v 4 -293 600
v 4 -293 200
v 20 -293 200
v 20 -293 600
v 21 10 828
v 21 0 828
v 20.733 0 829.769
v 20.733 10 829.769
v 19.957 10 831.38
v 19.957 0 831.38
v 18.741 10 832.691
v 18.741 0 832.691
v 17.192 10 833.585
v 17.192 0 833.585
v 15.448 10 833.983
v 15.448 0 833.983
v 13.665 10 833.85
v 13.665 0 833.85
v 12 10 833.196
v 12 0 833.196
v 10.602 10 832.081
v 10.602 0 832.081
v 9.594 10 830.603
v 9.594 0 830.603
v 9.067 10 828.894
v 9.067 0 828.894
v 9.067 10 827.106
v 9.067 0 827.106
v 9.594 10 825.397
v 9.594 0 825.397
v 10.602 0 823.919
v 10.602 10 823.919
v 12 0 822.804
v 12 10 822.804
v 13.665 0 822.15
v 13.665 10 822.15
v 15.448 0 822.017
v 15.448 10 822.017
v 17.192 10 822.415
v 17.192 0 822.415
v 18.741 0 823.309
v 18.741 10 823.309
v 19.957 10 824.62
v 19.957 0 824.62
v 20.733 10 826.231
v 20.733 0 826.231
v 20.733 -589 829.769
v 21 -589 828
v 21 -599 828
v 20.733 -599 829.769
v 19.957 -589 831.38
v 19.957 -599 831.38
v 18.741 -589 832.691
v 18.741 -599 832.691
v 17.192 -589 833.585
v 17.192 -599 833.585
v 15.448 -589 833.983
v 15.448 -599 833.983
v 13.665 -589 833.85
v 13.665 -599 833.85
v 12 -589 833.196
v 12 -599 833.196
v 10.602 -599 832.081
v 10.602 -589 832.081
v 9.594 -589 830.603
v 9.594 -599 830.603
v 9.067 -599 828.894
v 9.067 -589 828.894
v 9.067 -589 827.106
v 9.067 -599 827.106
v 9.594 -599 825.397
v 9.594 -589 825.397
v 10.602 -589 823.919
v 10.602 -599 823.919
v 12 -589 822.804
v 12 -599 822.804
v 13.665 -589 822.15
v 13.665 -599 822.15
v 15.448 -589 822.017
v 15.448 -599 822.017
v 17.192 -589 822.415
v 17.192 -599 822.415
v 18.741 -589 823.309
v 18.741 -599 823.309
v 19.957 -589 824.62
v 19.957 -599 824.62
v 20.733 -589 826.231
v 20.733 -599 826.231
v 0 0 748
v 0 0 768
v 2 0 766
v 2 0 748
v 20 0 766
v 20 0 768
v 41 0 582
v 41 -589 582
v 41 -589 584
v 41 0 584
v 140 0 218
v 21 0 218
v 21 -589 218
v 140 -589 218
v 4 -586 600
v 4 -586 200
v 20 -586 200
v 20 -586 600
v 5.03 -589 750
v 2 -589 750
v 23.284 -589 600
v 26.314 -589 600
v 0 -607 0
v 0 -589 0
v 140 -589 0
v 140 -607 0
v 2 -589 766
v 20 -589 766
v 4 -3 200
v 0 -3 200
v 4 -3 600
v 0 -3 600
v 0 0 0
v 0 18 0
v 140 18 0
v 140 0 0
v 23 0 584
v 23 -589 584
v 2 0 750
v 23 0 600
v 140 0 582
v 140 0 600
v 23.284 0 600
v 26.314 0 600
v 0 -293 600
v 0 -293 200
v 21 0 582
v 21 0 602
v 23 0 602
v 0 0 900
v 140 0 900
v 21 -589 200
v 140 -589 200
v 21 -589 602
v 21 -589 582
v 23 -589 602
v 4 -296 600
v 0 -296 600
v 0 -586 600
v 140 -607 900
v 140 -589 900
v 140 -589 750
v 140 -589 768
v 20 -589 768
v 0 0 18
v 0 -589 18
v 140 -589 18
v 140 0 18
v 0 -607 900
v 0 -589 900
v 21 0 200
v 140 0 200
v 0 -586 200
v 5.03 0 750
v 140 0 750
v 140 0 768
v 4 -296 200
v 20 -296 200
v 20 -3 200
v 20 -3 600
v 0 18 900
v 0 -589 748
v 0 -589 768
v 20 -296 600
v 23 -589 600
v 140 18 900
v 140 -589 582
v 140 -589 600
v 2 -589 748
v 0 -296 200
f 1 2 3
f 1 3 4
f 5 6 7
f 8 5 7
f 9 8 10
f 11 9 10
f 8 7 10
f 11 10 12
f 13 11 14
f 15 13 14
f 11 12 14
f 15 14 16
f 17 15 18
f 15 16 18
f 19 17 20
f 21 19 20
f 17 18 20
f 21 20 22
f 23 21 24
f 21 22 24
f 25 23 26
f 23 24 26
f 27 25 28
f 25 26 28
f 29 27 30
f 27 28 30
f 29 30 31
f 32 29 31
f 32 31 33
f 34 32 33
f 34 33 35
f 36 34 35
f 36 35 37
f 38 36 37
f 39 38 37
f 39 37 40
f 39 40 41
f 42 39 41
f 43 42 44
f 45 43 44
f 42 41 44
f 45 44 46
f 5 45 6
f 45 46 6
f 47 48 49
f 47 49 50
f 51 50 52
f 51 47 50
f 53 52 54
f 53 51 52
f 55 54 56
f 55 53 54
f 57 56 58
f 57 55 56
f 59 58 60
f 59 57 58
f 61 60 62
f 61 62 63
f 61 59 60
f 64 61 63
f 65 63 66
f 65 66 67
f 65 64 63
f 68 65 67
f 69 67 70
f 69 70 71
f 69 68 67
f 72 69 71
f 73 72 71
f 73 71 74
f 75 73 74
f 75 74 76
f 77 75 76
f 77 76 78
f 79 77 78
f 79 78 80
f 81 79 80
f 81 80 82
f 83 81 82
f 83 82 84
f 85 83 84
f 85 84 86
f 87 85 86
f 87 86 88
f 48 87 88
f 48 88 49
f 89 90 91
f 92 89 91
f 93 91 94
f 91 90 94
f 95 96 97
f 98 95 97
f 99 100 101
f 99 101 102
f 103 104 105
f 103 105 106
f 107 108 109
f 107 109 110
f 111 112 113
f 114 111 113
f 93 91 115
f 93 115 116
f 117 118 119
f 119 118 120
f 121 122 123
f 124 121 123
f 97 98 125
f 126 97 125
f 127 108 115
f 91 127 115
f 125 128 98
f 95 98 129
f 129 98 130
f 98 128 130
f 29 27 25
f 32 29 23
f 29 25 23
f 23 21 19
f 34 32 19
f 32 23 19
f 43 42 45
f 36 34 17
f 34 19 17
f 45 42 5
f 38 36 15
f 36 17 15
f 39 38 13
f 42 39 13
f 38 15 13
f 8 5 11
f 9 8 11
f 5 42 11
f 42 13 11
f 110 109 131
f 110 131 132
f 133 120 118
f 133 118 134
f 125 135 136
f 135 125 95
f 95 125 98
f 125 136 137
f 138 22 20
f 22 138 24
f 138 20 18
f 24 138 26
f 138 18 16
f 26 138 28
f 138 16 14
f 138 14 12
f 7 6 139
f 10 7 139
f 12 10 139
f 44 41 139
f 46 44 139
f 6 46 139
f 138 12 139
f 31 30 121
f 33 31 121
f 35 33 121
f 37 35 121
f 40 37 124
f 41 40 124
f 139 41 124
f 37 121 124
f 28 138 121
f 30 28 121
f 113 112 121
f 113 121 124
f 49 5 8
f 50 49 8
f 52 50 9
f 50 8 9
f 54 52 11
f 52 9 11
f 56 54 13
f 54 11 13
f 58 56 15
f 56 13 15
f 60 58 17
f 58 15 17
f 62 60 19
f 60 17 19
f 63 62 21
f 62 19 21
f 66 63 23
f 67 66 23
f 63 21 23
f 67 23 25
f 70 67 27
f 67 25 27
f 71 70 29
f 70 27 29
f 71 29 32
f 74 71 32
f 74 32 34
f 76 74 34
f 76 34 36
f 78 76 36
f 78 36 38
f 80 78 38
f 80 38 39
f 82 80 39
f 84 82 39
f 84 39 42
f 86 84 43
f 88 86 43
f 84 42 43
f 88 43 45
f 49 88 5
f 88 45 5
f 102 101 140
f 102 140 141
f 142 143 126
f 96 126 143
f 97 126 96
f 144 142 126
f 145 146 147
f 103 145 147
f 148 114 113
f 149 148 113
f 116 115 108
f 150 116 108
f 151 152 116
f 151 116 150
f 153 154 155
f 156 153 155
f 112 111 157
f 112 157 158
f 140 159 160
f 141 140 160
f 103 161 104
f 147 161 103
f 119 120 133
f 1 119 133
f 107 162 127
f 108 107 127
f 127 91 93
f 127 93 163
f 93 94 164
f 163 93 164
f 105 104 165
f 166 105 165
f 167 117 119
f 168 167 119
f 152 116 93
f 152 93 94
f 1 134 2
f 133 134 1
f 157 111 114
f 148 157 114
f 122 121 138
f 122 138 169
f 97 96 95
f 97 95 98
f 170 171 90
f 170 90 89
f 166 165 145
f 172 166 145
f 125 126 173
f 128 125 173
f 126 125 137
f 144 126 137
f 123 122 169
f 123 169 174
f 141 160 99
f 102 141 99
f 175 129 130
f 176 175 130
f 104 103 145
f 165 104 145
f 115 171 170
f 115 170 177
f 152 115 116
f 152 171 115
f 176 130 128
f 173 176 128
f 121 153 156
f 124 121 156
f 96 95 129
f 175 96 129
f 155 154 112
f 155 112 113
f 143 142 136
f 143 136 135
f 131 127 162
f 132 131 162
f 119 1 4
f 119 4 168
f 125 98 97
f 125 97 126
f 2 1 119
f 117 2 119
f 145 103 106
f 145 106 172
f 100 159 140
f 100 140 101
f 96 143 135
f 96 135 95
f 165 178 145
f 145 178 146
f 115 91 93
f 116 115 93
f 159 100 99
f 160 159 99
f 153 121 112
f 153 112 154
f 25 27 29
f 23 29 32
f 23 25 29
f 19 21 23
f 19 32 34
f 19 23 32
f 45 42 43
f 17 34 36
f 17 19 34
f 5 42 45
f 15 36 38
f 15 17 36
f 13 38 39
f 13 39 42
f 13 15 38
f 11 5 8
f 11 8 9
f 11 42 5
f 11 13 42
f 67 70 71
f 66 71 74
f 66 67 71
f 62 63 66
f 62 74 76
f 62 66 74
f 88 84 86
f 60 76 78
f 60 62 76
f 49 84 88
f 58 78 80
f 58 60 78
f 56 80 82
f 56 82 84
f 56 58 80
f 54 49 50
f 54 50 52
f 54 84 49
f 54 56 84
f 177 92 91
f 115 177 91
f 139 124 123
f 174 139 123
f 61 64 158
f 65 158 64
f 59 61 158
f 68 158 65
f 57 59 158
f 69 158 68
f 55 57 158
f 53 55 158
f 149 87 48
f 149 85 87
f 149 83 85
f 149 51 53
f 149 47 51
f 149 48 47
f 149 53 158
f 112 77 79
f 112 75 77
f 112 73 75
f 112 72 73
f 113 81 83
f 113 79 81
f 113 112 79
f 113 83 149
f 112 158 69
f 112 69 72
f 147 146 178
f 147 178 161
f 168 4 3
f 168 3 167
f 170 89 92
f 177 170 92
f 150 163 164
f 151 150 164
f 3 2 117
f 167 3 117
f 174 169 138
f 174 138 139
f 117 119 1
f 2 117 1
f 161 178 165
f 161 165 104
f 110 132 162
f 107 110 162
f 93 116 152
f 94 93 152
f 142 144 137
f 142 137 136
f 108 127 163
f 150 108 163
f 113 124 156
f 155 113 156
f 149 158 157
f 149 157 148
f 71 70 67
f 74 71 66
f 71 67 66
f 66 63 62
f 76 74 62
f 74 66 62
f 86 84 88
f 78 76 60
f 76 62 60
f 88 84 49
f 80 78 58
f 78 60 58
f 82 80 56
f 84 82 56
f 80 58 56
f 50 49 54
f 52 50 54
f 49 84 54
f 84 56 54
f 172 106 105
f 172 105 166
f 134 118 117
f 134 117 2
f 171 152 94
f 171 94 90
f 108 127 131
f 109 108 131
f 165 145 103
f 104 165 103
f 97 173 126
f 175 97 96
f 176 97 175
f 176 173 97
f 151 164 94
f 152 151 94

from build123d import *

# Parameters (mm, degrees)
F0_W           = 140
F0_H           = 18
F1_DEPTH       = 589
F2_W           = 140
F2_H           = 18
F3_DEPTH       = 900
F4_W           = 119
F4_H           = 18
F5_DEPTH       = 589
F7_DEPTH       = 589
F9_DEPTH       = 589
F11_DEPTH      = 589
F12_R          = 6
F13_DEPTH      = 10
F13_DEPTH_BACK = 599
F14_R          = 6
F15_DEPTH      = 609
F16_W          = 290
F16_H          = 400
F17_DEPTH      = 4
F18_W          = 290
F18_H          = 400
F19_DEPTH      = 16


with BuildPart() as f1:
    # F0 (on Front) → F1 (new body)
    with BuildSketch(Plane.XZ):
        with Locations((70, 9)):
            Rectangle(F0_W, F0_H)
    extrude(amount=F1_DEPTH)


with BuildPart() as f3:
    # F2 (on Top) → F3 (new body)
    with BuildSketch(Plane.XY):
        with Locations((70, 9)):
            Rectangle(F2_W, F2_H)
    extrude(amount=F3_DEPTH)


with BuildPart() as f3b:
    # F2 (on Top) → F3, piece 2 (new body)
    with BuildSketch(Plane.XY):
        with Locations((70, -598)):
            Rectangle(F2_W, F2_H)
    extrude(amount=F3_DEPTH)


with BuildPart() as f5:
    # F4 (on face) → F5 (new body, through all)
    with BuildSketch(Plane.XZ):
        with Locations((80.5, 209)):
            Rectangle(F4_W, F4_H)
    extrude(amount=F5_DEPTH)


with BuildPart() as f5b:
    # F4 (on face) → F5, piece 2 (new body, through all)
    with BuildSketch(Plane.XZ):
        Polygon((140, 582), (140, 600), (31, 600), (26, 600), (21, 600), (21, 582), align=None)
    extrude(amount=F5_DEPTH)


with BuildPart() as f5c:
    # F4 (on face) → F5, piece 3 (new body, through all)
    with BuildSketch(Plane.XZ):
        Polygon((140, 750), (140, 768), (0, 768), (0, 750), (26, 750), (31, 750), align=None)
    extrude(amount=F5_DEPTH)


with BuildPart() as f7_tool:
    # F6 (on face) → F7 (new body, through all)
    with BuildSketch(Plane.XZ):
        Polygon((21, 602), (21, 582), (41, 582), (41, 584), (23, 584), (23, 602), align=None)
        Polygon((20, 768), (0, 768), (0, 748), (2, 748), (2, 766), (20, 766), align=None)
    extrude(amount=F7_DEPTH)


with BuildPart() as f5b_1:
    add(f5b.part)

    # F7: cut by f7_tool
    add(f7_tool.part, mode=Mode.SUBTRACT)


with BuildPart() as f5c_1:
    add(f5c.part)

    # F7: cut by f7_tool
    add(f7_tool.part, mode=Mode.SUBTRACT)


with BuildPart() as f9:
    # F8 (on face) → F9 (new body, through all)
    with BuildSketch(Plane.XZ):
        Polygon((21, 602), (21, 582), (41, 582), (41, 584), (23, 584), (23, 602), align=None)
    extrude(amount=F9_DEPTH)


with BuildPart() as f9b:
    # F8 (on face) → F9, piece 2 (new body, through all)
    with BuildSketch(Plane.XZ):
        Polygon((20, 766), (20, 768), (0, 768), (0, 748), (2, 748), (2, 766), align=None)
    extrude(amount=F9_DEPTH)


with BuildPart() as f11:
    # F10 (on face) → F11 (new body, through all)
    with BuildSketch(Plane.XZ):
        Polygon((5.0300494684, 750), (2, 750), (23.2837837838, 600), (26.3138332522, 600), align=None)
    extrude(amount=F11_DEPTH)


with BuildPart() as f13_tool:
    # F12 (on face) → F13 (new body, two sides)
    with BuildSketch(Plane.XZ) as f13_sk:
        with Locations((15, 828)):
            Circle(F12_R)
    extrude(amount=-F13_DEPTH)
    extrude(f13_sk.sketch, amount=F13_DEPTH_BACK)


with BuildPart() as f3_1:
    add(f3.part)

    # F13: cut by f13_tool
    add(f13_tool.part, mode=Mode.SUBTRACT)


with BuildPart() as f3b_1:
    add(f3b.part)

    # F13: cut by f13_tool
    add(f13_tool.part, mode=Mode.SUBTRACT)


with BuildPart() as f15:
    # F14 (on face) → F15 (new body, through all)
    with BuildSketch(Plane.XZ.offset(-10)):
        with Locations((15, 828)):
            Circle(F14_R)
    extrude(amount=F15_DEPTH)


with BuildPart() as f17:
    # F16 (on face) → F17 (new body)
    with BuildSketch(Plane(origin=(0, 0, 0), x_dir=(0, -1, 0), z_dir=(-1, 0, 0))):
        with Locations((441, 400)):
            Rectangle(F16_W, F16_H)
    extrude(amount=-F17_DEPTH)


with BuildPart() as f17b:
    # F16 (on face) → F17, piece 2 (new body)
    with BuildSketch(Plane(origin=(0, 0, 0), x_dir=(0, -1, 0), z_dir=(-1, 0, 0))):
        with Locations((148, 400)):
            Rectangle(F16_W, F16_H)
    extrude(amount=-F17_DEPTH)


with BuildPart() as f19:
    # F18 (on face) → F19 (new body)
    with BuildSketch(Plane.YZ.offset(4)):
        with Locations((-441, 400)):
            Rectangle(F18_W, F18_H)
    extrude(amount=F19_DEPTH)


with BuildPart() as f19b:
    # F18 (on face) → F19, piece 2 (new body)
    with BuildSketch(Plane.YZ.offset(4)):
        with Locations((-148, 400)):
            Rectangle(F18_W, F18_H)
    extrude(amount=F19_DEPTH)


solid = Compound([f1.part, f5.part, f5b_1.part, f5c_1.part, f9.part, f9b.part, f11.part, f3_1.part, f3b_1.part, f15.part, f17.part, f17b.part, f19.part, f19b.part])
